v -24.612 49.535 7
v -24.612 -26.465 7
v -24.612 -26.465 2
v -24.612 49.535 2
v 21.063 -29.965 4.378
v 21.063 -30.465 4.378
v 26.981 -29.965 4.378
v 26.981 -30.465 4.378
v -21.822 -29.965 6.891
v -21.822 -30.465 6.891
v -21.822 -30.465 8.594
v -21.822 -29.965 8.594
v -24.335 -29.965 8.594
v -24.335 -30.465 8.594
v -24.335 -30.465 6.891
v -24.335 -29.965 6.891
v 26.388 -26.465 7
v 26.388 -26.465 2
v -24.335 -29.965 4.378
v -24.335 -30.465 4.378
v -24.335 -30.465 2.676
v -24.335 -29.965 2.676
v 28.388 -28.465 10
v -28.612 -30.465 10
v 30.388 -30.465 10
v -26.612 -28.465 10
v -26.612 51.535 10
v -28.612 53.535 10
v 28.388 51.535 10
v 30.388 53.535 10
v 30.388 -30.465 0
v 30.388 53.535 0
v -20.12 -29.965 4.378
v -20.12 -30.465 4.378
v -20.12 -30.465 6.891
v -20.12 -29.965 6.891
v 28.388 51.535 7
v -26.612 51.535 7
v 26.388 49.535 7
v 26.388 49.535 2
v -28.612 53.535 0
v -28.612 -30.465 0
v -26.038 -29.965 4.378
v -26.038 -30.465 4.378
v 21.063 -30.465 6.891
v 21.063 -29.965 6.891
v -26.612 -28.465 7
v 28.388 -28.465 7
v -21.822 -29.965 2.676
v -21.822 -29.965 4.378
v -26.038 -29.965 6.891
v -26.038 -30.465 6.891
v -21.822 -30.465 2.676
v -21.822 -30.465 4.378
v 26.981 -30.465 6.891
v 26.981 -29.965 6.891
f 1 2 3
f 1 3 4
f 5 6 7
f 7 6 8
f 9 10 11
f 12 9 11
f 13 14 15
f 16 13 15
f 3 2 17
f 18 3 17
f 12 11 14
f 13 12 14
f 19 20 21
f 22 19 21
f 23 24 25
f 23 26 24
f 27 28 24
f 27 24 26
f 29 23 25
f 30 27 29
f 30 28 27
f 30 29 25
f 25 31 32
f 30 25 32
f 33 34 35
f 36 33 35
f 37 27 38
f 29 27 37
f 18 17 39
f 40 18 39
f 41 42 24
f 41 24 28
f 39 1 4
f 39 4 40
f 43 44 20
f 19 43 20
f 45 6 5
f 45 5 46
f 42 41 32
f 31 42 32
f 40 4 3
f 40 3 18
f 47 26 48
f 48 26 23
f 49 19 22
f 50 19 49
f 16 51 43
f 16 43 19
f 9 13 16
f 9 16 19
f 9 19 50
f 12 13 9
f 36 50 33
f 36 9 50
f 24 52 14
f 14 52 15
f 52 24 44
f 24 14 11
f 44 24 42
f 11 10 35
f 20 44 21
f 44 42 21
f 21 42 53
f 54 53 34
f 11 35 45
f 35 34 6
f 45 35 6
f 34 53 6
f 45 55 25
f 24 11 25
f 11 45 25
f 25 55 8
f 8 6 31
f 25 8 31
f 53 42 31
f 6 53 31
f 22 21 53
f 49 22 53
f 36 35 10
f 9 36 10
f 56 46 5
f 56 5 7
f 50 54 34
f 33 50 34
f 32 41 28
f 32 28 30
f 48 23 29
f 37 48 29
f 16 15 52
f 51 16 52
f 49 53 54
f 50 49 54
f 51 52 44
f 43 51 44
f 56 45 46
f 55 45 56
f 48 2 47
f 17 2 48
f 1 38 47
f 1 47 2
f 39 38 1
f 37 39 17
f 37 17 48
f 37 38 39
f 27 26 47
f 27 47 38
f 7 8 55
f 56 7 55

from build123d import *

# Parameters (mm, degrees)
F0_W     = 59
F0_H     = 84
F1_DEPTH = 10
F2_W     = 55
F2_H     = 80
F3_DEPTH = 3
F4_W     = 51
F4_H     = 76
F5_DEPTH = 5
F6_W     = 5.918054
F6_H     = 2.513148
F7_DEPTH = 0.5


with BuildPart() as f1:
    # F0 (on Top) → F1 (new body)
    with BuildSketch(Plane.XY):
        with Locations((0.888158, 11.53495)):
            Rectangle(F0_W, F0_H)
    extrude(amount=F1_DEPTH)

    # F2 (on face) → F3 (cut)
    with BuildSketch(Plane.XY.offset(10)):
        with Locations((0.888158, 11.53495)):
            Rectangle(F2_W, F2_H)
    extrude(amount=-F3_DEPTH, mode=Mode.SUBTRACT)

    # F4 (on face) → F5 (cut)
    with BuildSketch(Plane.XY.offset(7)):
        with Locations((0.888158, 11.53495)):
            Rectangle(F4_W, F4_H)
    extrude(amount=-F5_DEPTH, mode=Mode.SUBTRACT)

    # F6 (on face) → F7 (cut)
    with BuildSketch(Plane.XZ.offset(30.46505)):
        Polygon((-20.119896, 4.378146), (-20.119896, 6.891294), (-21.822348, 6.891294), (-21.822348, 8.593746), (-24.335496, 8.593746), (-24.335496, 6.891294), (-26.037948, 6.891294), (-26.037948, 4.378146), (-24.335496, 4.378146), (-24.335496, 2.675694), (-21.822348, 2.675694), (-21.822348, 4.378146), align=None)
        with Locations((24.022301, 5.63472)):
            Rectangle(F6_W, F6_H)
    extrude(amount=-F7_DEPTH, mode=Mode.SUBTRACT)


solid = f1.part
